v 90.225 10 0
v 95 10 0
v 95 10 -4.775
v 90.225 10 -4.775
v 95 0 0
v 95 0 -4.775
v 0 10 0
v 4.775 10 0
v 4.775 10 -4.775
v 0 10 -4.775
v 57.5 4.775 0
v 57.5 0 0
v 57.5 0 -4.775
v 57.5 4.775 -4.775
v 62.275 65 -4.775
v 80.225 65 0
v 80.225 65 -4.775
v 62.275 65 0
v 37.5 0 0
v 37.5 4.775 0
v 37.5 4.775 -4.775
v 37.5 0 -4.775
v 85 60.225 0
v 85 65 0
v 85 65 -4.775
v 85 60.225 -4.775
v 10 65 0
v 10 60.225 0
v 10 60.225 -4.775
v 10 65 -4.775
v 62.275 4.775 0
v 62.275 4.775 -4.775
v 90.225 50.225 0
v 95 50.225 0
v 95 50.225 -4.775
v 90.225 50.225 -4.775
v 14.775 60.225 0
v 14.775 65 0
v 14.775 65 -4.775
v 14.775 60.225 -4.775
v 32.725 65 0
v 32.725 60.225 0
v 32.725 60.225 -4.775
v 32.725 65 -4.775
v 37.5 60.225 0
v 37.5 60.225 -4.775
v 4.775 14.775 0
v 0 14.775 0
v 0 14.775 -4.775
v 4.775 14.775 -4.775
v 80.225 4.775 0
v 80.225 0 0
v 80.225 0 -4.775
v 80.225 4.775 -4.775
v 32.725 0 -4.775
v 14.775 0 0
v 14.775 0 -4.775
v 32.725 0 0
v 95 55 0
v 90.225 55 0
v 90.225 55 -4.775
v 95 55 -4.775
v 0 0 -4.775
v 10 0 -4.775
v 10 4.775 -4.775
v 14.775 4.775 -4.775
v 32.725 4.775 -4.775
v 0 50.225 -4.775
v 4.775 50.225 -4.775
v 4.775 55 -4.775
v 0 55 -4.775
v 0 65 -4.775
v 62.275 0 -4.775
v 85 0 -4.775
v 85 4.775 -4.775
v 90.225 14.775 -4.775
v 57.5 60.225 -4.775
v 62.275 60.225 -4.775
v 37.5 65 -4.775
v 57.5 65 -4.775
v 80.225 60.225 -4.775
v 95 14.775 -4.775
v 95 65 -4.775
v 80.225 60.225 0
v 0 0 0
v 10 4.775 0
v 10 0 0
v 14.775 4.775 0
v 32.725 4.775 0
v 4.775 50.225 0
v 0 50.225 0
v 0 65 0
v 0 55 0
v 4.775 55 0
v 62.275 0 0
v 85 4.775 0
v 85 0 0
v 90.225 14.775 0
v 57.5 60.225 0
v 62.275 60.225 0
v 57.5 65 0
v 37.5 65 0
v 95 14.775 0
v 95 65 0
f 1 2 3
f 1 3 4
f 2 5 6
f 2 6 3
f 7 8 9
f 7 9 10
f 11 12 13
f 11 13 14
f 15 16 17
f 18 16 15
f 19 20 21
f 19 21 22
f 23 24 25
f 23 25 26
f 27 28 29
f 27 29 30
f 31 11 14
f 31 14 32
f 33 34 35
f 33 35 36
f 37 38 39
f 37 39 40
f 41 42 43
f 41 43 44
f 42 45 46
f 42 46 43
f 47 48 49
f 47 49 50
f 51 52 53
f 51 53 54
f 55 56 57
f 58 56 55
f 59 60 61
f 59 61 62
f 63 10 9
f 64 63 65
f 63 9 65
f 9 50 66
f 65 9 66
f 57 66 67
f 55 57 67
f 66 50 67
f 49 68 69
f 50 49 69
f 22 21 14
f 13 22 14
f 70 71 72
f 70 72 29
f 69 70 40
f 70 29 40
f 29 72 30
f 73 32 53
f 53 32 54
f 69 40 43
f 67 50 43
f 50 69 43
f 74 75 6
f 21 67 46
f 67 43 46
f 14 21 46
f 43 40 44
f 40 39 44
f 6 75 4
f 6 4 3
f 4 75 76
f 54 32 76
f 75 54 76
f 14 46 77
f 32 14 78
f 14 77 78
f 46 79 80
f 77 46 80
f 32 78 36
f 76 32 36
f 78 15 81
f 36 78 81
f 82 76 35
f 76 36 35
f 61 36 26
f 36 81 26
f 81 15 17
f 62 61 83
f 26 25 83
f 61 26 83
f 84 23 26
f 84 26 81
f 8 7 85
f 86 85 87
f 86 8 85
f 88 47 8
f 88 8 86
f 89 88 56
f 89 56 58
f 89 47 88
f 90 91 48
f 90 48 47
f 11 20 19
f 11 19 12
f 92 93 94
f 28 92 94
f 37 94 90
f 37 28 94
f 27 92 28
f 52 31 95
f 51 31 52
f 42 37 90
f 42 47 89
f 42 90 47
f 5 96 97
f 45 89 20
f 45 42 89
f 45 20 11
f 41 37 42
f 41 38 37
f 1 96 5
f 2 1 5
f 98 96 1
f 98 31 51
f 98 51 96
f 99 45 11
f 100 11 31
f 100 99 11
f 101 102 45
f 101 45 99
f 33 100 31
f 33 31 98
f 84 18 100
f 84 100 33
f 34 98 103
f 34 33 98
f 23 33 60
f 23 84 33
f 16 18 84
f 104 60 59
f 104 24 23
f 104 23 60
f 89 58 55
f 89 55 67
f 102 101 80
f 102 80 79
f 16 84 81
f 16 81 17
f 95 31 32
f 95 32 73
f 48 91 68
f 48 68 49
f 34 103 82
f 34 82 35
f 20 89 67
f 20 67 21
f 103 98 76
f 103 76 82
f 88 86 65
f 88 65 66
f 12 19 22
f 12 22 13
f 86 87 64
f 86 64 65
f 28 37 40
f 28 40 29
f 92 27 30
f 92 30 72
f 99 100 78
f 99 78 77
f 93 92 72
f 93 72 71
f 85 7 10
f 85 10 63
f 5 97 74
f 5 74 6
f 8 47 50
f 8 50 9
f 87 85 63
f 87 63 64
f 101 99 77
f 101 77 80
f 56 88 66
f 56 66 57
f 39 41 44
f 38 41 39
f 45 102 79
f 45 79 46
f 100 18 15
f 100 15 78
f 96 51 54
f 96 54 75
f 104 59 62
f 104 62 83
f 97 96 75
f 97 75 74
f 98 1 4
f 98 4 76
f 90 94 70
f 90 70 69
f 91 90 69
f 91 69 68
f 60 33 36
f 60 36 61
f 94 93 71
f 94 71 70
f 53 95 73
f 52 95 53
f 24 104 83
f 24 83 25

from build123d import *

# Parameters (mm, degrees)
BOSS_EXTRUDE1_DEPTH = 4.7752


with BuildPart() as part:
    # Sketch3 → Boss-Extrude1 (new body)
    with BuildSketch(Plane.XY):
        Polygon((10, 0), (10, 4.7752), (14.7752, 4.7752), (14.7752, 0), (32.7248, 0), (32.7248, 4.7752), (37.5, 4.7752), (37.5, 0), (47.5, 0), (57.5, 0), (57.5, 4.7752), (62.2752, 4.7752), (62.2752, 0), (80.2248, 0), (80.2248, 4.7752), (85, 4.7752), (85, 0), (95, 0), (95, 10), (90.2248, 10), (90.2248, 14.7752), (95, 14.7752), (95, 32.5), (95, 50.2248), (90.2248, 50.2248), (90.2248, 55), (95, 55), (95, 65), (85, 65), (85, 60.2248), (80.2248, 60.2248), (80.2248, 65), (62.2752, 65), (62.2752, 60.2248), (57.5, 60.2248), (57.5, 65), (37.5, 65), (37.5, 60.2248), (32.7248, 60.2248), (32.7248, 65), (14.7752, 65), (14.7752, 60.2248), (10, 60.2248), (10, 65), (0, 65), (0, 55), (4.7752, 55), (4.7752, 50.2248), (0, 50.2248), (0, 14.7752), (4.7752, 14.7752), (4.7752, 10), (0, 10), (0, 0), align=None)
    extrude(amount=-BOSS_EXTRUDE1_DEPTH)


solid = part.part
